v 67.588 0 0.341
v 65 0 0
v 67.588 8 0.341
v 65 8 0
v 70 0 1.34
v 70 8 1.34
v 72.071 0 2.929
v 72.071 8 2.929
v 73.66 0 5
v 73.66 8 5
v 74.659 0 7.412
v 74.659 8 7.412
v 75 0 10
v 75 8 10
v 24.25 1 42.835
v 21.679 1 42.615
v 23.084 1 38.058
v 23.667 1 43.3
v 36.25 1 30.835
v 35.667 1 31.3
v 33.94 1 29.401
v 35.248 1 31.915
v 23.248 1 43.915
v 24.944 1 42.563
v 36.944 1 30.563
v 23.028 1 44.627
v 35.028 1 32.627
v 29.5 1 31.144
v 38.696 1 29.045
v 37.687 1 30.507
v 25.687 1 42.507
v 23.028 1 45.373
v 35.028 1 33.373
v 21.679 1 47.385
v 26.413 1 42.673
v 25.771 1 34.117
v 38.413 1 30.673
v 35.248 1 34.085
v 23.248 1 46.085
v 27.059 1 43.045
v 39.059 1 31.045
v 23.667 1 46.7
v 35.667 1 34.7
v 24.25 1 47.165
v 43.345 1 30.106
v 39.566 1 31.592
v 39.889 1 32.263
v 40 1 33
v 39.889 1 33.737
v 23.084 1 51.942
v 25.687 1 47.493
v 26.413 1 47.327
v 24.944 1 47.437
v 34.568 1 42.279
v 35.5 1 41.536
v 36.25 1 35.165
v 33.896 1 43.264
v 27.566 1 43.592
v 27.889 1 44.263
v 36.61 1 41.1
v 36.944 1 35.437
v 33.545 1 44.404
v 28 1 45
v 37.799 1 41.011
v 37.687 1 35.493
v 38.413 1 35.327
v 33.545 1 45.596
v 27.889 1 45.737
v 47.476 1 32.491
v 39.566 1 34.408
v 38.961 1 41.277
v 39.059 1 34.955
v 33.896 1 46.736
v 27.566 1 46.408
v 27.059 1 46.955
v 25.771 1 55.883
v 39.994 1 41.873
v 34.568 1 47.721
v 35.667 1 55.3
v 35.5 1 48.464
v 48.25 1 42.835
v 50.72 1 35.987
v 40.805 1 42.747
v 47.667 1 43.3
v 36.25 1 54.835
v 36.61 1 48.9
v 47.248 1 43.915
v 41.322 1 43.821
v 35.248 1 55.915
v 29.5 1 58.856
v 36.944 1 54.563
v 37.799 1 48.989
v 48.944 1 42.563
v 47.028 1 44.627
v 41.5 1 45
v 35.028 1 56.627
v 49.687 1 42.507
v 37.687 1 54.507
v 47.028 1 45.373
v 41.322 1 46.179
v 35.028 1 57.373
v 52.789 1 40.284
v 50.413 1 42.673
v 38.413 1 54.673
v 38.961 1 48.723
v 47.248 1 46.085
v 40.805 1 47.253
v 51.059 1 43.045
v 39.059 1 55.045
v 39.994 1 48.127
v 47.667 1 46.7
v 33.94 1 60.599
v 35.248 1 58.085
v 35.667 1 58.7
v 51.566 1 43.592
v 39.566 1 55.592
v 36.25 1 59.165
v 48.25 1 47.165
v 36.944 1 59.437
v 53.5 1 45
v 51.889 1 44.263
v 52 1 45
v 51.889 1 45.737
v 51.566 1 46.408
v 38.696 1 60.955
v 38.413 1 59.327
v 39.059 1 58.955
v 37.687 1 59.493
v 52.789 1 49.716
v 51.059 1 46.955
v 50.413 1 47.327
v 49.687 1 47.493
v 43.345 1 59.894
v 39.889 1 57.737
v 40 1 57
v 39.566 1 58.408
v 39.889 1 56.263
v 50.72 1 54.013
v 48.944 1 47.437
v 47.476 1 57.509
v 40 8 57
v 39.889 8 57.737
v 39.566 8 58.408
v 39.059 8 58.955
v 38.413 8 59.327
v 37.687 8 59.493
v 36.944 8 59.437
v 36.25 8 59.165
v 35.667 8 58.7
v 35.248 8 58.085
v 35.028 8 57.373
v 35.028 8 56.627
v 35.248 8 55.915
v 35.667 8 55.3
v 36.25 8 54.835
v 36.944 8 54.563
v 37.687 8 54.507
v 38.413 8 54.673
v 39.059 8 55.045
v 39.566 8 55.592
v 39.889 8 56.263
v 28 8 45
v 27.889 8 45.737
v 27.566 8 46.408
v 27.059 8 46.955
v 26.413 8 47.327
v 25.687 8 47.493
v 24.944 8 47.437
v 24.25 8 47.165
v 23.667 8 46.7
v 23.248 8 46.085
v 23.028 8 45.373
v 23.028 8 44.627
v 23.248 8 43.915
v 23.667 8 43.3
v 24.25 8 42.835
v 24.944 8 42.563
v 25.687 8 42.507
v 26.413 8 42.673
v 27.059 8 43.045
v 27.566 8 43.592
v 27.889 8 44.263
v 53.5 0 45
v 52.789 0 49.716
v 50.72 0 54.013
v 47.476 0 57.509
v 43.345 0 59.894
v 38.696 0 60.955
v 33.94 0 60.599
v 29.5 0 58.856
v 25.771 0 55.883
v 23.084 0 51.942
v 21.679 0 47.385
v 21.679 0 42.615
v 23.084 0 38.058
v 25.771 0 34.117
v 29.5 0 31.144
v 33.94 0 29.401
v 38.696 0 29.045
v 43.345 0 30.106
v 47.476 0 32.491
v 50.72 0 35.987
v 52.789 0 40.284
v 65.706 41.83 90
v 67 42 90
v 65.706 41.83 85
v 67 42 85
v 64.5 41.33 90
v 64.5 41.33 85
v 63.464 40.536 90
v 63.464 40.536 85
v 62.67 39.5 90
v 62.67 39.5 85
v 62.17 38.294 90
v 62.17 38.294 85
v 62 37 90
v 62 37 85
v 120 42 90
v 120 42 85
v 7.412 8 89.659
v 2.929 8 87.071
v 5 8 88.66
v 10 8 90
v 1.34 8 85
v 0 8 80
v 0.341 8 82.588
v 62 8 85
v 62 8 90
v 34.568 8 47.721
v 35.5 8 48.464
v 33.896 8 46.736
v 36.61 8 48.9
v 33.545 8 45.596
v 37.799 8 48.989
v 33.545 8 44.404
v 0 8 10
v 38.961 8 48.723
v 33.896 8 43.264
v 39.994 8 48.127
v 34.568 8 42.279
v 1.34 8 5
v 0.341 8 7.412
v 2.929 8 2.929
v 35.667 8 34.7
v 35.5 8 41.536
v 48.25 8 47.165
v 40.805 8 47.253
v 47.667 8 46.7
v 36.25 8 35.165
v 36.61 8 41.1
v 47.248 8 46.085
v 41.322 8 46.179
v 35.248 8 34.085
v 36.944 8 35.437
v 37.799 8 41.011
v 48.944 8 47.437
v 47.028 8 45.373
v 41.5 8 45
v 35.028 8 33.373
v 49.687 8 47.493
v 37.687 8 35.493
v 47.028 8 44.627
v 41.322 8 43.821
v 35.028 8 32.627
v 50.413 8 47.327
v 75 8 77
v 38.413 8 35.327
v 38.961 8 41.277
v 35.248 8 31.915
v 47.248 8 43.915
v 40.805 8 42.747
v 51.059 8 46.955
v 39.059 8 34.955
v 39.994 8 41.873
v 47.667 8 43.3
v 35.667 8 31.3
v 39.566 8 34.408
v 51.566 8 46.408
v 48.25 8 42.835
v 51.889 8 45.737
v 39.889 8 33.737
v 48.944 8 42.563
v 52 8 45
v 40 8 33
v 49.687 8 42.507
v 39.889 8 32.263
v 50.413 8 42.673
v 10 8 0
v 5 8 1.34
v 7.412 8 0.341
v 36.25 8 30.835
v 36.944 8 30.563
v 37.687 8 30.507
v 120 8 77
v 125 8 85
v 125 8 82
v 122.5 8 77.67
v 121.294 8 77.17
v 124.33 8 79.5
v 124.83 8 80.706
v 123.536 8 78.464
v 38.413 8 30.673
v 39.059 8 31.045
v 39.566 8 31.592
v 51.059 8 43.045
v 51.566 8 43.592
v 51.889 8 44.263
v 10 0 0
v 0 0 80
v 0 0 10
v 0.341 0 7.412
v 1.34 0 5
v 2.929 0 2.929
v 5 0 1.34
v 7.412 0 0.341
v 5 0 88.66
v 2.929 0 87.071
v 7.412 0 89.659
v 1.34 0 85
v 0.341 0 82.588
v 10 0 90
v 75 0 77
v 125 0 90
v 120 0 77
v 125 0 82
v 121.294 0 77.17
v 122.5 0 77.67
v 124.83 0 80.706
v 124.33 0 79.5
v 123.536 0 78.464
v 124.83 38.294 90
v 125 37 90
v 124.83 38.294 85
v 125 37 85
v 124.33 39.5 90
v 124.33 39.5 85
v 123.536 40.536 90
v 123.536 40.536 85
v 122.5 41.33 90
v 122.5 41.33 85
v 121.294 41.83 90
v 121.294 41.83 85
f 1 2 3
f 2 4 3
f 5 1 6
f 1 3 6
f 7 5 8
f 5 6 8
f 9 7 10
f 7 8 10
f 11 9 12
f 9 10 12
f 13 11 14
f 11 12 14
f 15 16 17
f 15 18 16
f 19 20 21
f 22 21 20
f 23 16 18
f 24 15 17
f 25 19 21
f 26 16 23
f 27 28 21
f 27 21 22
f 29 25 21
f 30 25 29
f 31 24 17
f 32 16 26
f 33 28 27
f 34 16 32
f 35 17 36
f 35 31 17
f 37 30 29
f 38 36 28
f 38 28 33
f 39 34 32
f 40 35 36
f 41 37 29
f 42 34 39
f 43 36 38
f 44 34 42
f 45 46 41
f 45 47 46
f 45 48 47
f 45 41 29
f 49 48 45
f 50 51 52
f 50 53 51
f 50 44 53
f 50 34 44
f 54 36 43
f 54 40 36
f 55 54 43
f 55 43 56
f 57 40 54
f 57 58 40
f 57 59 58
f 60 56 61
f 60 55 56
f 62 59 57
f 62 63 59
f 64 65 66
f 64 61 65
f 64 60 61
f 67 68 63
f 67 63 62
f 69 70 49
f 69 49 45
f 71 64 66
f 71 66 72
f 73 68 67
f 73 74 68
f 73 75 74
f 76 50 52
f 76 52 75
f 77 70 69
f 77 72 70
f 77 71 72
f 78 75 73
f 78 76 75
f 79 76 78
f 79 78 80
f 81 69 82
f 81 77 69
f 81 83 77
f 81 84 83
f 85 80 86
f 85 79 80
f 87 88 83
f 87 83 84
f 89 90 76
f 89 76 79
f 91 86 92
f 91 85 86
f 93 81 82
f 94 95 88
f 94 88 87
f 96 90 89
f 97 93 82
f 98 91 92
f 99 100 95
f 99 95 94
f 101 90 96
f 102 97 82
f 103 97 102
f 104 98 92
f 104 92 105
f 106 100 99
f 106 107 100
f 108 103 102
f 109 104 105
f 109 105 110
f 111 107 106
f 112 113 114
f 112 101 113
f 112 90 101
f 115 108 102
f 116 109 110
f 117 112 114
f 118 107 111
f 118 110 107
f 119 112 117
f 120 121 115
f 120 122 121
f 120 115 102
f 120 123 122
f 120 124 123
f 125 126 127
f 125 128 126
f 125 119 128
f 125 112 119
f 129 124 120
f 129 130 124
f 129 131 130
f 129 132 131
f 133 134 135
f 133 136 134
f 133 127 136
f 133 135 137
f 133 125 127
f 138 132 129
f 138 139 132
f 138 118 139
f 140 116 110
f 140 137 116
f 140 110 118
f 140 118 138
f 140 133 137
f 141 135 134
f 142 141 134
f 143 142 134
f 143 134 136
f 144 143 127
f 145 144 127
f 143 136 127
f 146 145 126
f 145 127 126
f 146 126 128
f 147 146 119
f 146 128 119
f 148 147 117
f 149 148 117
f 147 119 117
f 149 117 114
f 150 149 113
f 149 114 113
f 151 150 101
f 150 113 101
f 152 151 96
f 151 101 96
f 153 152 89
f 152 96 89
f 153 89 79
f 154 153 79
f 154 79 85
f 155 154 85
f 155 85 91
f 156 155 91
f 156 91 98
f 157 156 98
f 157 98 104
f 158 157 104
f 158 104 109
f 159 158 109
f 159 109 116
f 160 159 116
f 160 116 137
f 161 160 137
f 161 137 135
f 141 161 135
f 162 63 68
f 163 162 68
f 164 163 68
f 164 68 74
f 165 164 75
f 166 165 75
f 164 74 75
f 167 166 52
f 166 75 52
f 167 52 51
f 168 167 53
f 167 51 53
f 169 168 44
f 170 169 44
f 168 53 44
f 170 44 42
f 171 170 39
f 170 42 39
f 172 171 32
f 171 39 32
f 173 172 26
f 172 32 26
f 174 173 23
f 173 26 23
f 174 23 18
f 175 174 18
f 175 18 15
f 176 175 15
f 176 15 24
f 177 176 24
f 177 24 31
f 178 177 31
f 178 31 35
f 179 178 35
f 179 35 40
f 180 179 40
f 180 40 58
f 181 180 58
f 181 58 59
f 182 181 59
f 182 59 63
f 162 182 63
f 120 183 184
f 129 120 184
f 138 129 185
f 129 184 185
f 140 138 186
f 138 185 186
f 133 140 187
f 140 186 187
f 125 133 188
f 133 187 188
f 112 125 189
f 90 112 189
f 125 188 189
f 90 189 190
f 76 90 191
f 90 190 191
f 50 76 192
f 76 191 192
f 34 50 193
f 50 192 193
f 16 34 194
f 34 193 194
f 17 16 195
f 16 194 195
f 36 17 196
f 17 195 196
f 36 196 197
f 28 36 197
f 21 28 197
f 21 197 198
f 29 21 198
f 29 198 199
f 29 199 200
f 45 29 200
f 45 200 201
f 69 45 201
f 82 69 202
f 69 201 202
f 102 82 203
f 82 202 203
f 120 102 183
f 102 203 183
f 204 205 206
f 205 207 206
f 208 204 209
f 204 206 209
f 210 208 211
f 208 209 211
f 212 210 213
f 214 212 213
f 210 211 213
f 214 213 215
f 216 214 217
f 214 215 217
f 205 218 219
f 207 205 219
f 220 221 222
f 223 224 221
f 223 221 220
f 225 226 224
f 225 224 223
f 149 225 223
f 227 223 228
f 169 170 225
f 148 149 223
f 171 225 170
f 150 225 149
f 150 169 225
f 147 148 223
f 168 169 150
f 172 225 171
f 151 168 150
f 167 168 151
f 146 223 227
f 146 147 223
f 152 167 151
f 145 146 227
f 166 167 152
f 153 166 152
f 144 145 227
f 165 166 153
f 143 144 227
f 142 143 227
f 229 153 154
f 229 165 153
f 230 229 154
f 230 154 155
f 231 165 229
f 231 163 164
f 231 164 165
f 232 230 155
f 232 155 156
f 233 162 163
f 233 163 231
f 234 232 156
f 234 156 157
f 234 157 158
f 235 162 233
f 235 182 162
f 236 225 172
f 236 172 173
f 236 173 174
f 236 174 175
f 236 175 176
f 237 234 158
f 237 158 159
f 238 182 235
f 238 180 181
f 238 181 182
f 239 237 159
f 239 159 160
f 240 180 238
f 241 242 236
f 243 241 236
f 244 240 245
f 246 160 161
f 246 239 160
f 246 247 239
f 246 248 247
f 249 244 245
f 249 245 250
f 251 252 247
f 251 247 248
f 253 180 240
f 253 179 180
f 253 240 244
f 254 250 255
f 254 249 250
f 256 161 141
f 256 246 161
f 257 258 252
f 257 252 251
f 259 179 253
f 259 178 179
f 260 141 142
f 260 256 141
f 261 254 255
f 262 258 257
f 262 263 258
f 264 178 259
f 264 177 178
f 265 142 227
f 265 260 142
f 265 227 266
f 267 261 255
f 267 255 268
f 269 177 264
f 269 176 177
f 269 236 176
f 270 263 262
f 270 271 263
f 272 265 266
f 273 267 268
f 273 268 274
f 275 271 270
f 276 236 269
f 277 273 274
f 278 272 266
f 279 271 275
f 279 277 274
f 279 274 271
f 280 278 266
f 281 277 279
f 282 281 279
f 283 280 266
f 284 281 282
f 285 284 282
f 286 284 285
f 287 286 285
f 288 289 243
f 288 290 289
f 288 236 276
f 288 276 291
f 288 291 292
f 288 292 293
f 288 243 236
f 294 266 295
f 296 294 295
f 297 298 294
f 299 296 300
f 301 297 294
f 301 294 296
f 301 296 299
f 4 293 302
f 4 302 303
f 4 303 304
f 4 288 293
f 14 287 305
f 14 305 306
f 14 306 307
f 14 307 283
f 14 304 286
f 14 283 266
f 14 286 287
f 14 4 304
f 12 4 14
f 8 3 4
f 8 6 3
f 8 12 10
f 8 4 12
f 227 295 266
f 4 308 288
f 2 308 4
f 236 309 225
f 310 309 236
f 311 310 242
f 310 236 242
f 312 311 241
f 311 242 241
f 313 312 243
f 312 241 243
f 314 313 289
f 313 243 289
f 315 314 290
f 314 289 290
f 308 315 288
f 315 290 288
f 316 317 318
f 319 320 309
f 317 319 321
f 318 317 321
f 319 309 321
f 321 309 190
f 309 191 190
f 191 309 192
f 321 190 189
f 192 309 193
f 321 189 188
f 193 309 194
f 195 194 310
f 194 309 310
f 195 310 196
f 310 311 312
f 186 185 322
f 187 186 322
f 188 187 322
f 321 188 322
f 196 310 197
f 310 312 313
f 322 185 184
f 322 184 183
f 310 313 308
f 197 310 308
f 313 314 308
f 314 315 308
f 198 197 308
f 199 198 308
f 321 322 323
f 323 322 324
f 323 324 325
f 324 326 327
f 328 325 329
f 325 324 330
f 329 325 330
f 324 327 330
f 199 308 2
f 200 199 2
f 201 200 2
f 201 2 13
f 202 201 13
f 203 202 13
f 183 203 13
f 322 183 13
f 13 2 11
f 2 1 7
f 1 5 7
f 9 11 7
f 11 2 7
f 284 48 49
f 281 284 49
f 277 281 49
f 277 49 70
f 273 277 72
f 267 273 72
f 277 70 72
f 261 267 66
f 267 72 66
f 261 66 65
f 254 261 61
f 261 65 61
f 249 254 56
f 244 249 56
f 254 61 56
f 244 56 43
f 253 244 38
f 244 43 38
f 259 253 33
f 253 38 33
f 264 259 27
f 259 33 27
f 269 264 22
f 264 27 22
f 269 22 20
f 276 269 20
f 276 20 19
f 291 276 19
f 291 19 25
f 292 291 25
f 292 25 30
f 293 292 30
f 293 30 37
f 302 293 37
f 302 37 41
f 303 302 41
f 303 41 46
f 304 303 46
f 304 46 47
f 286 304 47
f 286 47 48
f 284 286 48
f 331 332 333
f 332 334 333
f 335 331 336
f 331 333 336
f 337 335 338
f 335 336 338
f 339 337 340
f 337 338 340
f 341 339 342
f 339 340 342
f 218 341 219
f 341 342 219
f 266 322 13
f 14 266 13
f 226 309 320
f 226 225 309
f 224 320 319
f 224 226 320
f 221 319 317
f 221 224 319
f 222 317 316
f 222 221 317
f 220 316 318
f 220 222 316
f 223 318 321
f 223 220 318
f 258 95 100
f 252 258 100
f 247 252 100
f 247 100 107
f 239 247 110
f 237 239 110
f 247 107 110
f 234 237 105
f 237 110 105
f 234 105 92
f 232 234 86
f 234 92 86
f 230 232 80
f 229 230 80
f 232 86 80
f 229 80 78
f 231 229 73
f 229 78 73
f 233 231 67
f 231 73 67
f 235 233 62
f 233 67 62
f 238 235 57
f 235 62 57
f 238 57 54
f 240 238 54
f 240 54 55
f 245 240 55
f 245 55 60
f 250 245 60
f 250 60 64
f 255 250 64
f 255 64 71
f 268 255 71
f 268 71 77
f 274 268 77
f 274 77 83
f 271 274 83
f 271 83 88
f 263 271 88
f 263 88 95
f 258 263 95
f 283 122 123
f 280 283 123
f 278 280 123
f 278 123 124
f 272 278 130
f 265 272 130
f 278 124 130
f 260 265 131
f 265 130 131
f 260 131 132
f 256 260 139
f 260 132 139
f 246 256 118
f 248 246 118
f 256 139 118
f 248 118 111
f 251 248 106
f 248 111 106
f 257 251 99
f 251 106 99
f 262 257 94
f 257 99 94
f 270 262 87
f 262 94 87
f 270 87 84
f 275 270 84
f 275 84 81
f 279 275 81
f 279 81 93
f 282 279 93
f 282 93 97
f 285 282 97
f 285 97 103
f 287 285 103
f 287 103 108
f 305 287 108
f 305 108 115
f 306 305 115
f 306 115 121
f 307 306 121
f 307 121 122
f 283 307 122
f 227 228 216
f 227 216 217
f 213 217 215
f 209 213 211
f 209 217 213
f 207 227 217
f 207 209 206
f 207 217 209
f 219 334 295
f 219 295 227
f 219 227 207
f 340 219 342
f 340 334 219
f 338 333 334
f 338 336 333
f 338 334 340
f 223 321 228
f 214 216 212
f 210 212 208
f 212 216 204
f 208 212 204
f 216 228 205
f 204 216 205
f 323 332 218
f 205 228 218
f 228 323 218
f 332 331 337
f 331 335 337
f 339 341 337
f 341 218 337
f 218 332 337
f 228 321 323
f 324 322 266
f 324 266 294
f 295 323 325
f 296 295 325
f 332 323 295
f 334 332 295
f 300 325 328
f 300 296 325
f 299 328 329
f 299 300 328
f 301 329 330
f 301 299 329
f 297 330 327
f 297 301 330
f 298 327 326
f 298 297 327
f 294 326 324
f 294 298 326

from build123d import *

# Parameters (mm, degrees)
SKETCH1_W           = 75
SKETCH1_H           = 90
SKETCH1_W_2         = 50
SKETCH1_H_2         = 13
BOSS_EXTRUDE1_DEPTH = 8
FILLET2_R           = 10
FILLET3_R           = 10
FILLET4_R           = 10
SKETCH7_W           = 5
SKETCH7_H           = 34
BOSS_EXTRUDE3_DEPTH = 63
FILLET5_R           = 5
FILLET6_R           = 5
FILLET7_R           = 5
SKETCH2_R           = 16
CUT_EXTRUDE1_DEPTH  = 1
CUT_EXTRUDE2_REACH  = 43
SKETCH8_R           = 2.5
SKETCH8_R_2         = 4


with BuildPart() as part:
    # Sketch1 → Boss-Extrude1 (new body)
    with BuildSketch(Plane(origin=(0, 0, 0), x_dir=(1, 0, 0), z_dir=(0, 1, 0))):
        with Locations((37.5, -45)):
            Rectangle(SKETCH1_W, SKETCH1_H)
        with Locations((100, -83.5)):
            Rectangle(SKETCH1_W_2, SKETCH1_H_2)
    extrude(amount=BOSS_EXTRUDE1_DEPTH)

    # Fillet2
    fillet2_edges = [part.edges().sort_by_distance(p)[0] for p in [
        (0, 4, 0),
    ]]
    fillet(fillet2_edges, radius=FILLET2_R)

    # Fillet3
    fillet3_edges = [part.edges().sort_by_distance(p)[0] for p in [
        (0, 4, 90),
    ]]
    fillet(fillet3_edges, radius=FILLET3_R)

    # Fillet4
    fillet4_edges = [part.edges().sort_by_distance(p)[0] for p in [
        (75, 4, 0),
    ]]
    fillet(fillet4_edges, radius=FILLET4_R)

    # Sketch7 → Boss-Extrude3 (add)
    with BuildSketch(Plane(origin=(125, 0, 0), x_dir=(0, 0, -1), z_dir=(1, 0, 0))):
        with Locations((-87.5, 25)):
            Rectangle(SKETCH7_W, SKETCH7_H)
    extrude(amount=-BOSS_EXTRUDE3_DEPTH)

    # Fillet5
    fillet5_edges = [part.edges().sort_by_distance(p)[0] for p in [
        (125, 42, 87.5),
    ]]
    fillet(fillet5_edges, radius=FILLET5_R)

    # Fillet6
    fillet6_edges = [part.edges().sort_by_distance(p)[0] for p in [
        (125, 4, 77),
    ]]
    fillet(fillet6_edges, radius=FILLET6_R)

    # Fillet7
    fillet7_edges = [part.edges().sort_by_distance(p)[0] for p in [
        (62, 42, 87.5),
    ]]
    fillet(fillet7_edges, radius=FILLET7_R)

    # Sketch2 → Cut-Extrude1 (cut)
    with BuildSketch(Plane.XZ):
        with Locations((37.5, 45)):
            Circle(SKETCH2_R)
    extrude(amount=-CUT_EXTRUDE1_DEPTH, mode=Mode.SUBTRACT)

    # Sketch8 → Cut-Extrude2 (cut, up to next)
    with BuildSketch(Plane.XZ.offset(-1), mode=Mode.PRIVATE) as cut_extrude2_sk1:
        with Locations((37.5, 57)):
            Circle(SKETCH8_R)
    cut_extrude2_tool1 = extrude(cut_extrude2_sk1.sketch, amount=-CUT_EXTRUDE2_REACH, mode=Mode.PRIVATE) & part.part
    add(cut_extrude2_tool1.solids().sort_by_distance((37.5, 1, 57))[0], mode=Mode.SUBTRACT)
    # Sketch8 → Cut-Extrude2 (cut, up to next)
    with BuildSketch(Plane.XZ.offset(-1), mode=Mode.PRIVATE) as cut_extrude2_sk2:
        with Locations((37.5, 45)):
            Circle(SKETCH8_R_2)
    cut_extrude2_tool2 = extrude(cut_extrude2_sk2.sketch, amount=-CUT_EXTRUDE2_REACH, mode=Mode.PRIVATE) & part.part
    add(cut_extrude2_tool2.solids().sort_by_distance((37.5, 1, 45))[0], mode=Mode.SUBTRACT)
    # Sketch8 → Cut-Extrude2 (cut, up to next)
    with BuildSketch(Plane.XZ.offset(-1), mode=Mode.PRIVATE) as cut_extrude2_sk3:
        with Locations((49.5, 45)):
            Circle(SKETCH8_R)
    cut_extrude2_tool3 = extrude(cut_extrude2_sk3.sketch, amount=-CUT_EXTRUDE2_REACH, mode=Mode.PRIVATE) & part.part
    add(cut_extrude2_tool3.solids().sort_by_distance((49.5, 1, 45))[0], mode=Mode.SUBTRACT)
    # Sketch8 → Cut-Extrude2 (cut, up to next)
    with BuildSketch(Plane.XZ.offset(-1), mode=Mode.PRIVATE) as cut_extrude2_sk4:
        with Locations((37.5, 33)):
            Circle(SKETCH8_R)
    cut_extrude2_tool4 = extrude(cut_extrude2_sk4.sketch, amount=-CUT_EXTRUDE2_REACH, mode=Mode.PRIVATE) & part.part
    add(cut_extrude2_tool4.solids().sort_by_distance((37.5, 1, 33))[0], mode=Mode.SUBTRACT)
    # Sketch8 → Cut-Extrude2 (cut, up to next)
    with BuildSketch(Plane.XZ.offset(-1), mode=Mode.PRIVATE) as cut_extrude2_sk5:
        with Locations((25.5, 45)):
            Circle(SKETCH8_R)
    cut_extrude2_tool5 = extrude(cut_extrude2_sk5.sketch, amount=-CUT_EXTRUDE2_REACH, mode=Mode.PRIVATE) & part.part
    add(cut_extrude2_tool5.solids().sort_by_distance((25.5, 1, 45))[0], mode=Mode.SUBTRACT)


solid = part.part
